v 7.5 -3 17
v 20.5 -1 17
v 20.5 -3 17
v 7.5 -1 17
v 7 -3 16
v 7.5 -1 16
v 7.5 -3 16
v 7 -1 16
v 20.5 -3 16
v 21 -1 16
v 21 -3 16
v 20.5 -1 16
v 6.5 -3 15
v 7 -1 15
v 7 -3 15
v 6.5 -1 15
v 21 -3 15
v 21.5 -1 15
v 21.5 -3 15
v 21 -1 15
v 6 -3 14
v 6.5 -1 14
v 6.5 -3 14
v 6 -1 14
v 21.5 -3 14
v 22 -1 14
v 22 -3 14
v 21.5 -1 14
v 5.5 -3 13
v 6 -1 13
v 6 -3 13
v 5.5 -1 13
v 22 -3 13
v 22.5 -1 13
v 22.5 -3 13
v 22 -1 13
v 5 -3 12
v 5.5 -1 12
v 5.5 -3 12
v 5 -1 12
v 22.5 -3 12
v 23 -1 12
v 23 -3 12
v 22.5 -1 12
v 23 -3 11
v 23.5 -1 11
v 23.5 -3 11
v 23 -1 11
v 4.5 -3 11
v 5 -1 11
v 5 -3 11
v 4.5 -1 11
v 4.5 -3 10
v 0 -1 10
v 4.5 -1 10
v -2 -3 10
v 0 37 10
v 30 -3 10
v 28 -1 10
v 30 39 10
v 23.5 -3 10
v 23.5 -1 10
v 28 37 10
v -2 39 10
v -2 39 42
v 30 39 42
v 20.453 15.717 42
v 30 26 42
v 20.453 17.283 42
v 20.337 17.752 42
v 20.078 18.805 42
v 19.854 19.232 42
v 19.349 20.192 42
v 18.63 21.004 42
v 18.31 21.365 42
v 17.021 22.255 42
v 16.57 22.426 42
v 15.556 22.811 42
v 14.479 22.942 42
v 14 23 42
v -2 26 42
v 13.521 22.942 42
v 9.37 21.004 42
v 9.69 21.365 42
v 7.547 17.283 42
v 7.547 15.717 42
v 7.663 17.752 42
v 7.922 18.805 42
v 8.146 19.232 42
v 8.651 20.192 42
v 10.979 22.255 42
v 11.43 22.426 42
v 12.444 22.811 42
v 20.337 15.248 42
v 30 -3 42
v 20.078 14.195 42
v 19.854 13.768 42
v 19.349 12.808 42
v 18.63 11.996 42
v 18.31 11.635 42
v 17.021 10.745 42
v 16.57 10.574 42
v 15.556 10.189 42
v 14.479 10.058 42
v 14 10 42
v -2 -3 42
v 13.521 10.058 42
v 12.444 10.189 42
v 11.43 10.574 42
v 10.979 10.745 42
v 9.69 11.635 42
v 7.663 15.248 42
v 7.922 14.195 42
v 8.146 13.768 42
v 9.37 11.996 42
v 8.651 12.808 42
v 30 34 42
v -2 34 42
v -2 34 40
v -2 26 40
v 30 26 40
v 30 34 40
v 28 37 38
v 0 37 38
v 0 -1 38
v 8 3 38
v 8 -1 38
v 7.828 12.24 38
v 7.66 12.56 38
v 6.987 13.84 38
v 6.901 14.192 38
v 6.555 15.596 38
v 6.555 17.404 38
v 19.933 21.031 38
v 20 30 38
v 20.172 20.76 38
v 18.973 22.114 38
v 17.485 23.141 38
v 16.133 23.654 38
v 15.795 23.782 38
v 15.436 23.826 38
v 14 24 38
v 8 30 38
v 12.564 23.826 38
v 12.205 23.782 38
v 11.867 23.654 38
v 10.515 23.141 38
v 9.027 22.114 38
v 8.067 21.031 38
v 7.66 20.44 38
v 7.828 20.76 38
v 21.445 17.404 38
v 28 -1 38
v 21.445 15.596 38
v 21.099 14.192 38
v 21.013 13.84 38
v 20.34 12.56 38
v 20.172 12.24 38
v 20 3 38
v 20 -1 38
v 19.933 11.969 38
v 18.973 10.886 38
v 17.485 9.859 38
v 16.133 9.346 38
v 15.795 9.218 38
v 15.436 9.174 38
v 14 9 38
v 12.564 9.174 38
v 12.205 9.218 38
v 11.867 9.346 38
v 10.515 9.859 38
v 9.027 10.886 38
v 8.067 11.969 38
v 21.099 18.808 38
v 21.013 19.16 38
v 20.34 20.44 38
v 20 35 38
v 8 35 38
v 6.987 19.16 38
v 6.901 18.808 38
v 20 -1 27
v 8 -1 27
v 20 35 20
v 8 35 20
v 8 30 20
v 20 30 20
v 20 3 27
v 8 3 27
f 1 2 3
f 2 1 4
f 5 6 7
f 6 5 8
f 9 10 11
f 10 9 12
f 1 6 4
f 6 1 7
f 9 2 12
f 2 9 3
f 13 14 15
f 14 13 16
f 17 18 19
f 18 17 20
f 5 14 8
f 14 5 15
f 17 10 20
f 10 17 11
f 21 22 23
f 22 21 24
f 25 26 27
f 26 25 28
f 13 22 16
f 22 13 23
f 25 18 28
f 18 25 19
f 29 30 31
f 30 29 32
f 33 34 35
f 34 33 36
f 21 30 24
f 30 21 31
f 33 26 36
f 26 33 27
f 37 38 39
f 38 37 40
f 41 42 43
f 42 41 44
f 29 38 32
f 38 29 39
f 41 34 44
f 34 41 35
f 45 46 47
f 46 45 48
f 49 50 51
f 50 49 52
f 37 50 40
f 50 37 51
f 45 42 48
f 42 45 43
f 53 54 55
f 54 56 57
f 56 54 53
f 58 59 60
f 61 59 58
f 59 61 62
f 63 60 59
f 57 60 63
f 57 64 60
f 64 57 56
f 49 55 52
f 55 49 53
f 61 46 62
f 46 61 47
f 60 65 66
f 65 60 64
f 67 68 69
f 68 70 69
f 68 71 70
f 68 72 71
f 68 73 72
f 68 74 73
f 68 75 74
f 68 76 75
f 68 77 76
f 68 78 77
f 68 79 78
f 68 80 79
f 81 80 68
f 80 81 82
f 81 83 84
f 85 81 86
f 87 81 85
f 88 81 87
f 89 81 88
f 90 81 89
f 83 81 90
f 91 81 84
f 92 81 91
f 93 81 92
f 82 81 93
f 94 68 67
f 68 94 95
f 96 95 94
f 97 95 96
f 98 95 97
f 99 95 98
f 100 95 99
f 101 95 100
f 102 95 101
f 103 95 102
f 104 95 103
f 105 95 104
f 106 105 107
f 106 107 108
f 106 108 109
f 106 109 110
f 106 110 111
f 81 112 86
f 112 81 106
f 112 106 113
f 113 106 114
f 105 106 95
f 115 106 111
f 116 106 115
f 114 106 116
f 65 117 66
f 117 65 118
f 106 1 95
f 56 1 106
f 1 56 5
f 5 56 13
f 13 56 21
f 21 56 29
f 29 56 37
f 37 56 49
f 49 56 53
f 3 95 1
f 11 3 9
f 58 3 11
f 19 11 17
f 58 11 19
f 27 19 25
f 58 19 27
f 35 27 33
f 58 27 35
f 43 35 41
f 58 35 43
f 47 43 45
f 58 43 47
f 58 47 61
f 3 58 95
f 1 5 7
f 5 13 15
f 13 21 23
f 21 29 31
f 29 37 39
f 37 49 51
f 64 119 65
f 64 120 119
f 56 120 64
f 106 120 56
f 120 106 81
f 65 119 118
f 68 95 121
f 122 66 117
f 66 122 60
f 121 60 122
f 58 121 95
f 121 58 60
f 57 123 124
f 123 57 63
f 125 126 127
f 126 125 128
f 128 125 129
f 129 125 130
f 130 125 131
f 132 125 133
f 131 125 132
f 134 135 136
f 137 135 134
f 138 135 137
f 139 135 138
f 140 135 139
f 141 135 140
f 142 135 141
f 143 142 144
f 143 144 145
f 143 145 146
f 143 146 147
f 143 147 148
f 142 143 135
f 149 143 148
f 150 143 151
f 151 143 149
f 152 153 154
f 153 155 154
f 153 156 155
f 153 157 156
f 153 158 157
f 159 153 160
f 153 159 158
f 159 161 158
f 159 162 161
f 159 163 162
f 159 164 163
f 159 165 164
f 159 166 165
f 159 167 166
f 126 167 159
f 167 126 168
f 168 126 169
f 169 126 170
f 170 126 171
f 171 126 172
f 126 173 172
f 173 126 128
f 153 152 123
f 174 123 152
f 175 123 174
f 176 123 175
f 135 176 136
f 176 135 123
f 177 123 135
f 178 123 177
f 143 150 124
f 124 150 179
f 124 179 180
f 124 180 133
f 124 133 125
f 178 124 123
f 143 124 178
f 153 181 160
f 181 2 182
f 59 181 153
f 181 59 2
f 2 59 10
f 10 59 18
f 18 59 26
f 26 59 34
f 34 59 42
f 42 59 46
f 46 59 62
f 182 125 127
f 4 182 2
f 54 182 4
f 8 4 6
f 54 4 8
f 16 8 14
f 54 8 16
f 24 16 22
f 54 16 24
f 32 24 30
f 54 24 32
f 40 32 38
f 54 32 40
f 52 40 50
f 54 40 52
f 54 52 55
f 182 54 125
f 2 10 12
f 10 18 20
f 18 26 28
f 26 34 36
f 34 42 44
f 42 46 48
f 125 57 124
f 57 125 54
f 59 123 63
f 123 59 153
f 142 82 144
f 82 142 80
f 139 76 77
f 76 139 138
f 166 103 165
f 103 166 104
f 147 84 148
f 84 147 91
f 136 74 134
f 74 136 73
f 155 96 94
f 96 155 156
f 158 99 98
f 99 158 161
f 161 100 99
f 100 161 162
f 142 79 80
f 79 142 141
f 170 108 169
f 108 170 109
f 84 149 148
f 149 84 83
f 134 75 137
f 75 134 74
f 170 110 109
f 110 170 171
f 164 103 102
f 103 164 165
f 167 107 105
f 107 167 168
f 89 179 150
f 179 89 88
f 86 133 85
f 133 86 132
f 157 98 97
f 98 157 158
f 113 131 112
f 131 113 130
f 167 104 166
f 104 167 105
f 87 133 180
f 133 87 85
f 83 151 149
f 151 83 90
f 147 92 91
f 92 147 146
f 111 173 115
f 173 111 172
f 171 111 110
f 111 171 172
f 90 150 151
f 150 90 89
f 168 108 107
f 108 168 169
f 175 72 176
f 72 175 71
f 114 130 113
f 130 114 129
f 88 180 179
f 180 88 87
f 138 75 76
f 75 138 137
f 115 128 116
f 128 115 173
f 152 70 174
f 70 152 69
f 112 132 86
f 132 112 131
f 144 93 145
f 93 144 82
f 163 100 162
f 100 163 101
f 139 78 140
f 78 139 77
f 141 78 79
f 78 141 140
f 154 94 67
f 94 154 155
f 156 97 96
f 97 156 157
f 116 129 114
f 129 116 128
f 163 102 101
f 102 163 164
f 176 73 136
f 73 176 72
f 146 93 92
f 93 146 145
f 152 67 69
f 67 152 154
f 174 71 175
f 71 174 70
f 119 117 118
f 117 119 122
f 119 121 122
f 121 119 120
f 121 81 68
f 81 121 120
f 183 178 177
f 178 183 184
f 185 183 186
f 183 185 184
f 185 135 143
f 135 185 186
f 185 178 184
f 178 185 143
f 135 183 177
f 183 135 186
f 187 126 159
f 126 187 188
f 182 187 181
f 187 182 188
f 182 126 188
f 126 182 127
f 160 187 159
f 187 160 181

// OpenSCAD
// Shell!
outerX = 42;
outerY = 32;
outerZ = 32;

// BUTTON!
buttonRadius = 7;
buttonOffsetX = 16;

// Wall!
wallSize = 2;

// Ziptie
zipTieSize = 8;
zipTieOffset = 13;

// parts
drawHead = true;
drawTinyHead = false;
drawFoot = false;

if (drawHead) {
  
  translate([30, -3, 10])
    rotate([0, 0, 90])  
  union() {
    difference(){
      cube([outerX, outerY, outerZ]);
      
      // Hollow out
      union() {
        translate([0,0,-7]);
        innerCube(outerX, outerY, outerZ, wallSize);
      }
      
      // USB hole!
      for (i=[3:9]){
        translate([-1, 11-i/2, 9-i])    
          cube([5, 10+i, 1]);
      }
      
      // Button!
      translate([buttonOffsetX + buttonRadius/2, outerY / 2, outerZ - (wallSize * 3)])
        cylinder(r1=buttonRadius+1, r2=buttonRadius-1, h=wallSize * 4);
      
      // Ziptie!
      translate([outerX - zipTieOffset, -1, outerZ - wallSize])
        cube([zipTieSize, outerY + 2, wallSize * 2]);
    }


    // keep pins
    translate([outerX - 9, outerY / 2 - 6, 10]) 
      cube([5, 12, outerZ - 13]);
    translate([1, outerY / 2 - 6, 17]) 
      cube([5, 12, outerZ - 18]);
  }
}

if (drawTinyHead) {
  
  translate([30, -3, 10])
    rotate([0, 0, 90])  
  union() {
    difference(){
      cube([outerX, outerY, outerZ -17]);
      
      // Hollow out
      union() {
        translate([0,0,-7]);
        innerCube(outerX, outerY, outerZ - 17, wallSize);
      }
      
      // USB hole!
      for (i=[3:9]){
        translate([-1, 11-i/2, 9-i])    
          cube([5, 10+i, 1]);
      }
      
      // Ziptie!
      translate([outerX - zipTieOffset, -1, outerZ - wallSize - 17])
        cube([zipTieSize, outerY + 2, wallSize * 2]);
    }
  }
}

// NOTE: places cube 1 unit lower about Z for clean differences.
module innerCube(x, y, z, wallSize) {  
  translate([wallSize, wallSize, -1])
    cube([x - (wallSize * 2), y - (wallSize * 2), z - (wallSize * 2) + 1]);
}

if (drawFoot){
  difference(){
    union(){ 
      difference() {
        union() {
          translate([-2, -3, -4])
            cube([32, 42, 8]);         
        }
        cube([27, 35, 16]);
          
        // Cord slot
        translate([7, 20, 2])
            cube([12, 50, 6]);    
      }
      difference() {
        union(){
          // flaps
          union(){ 
          translate([1, 0, -4])
              cube([5, 1, 10]);
          translate([21, 0, -4])
              cube([5, 1, 10]);
          }
          translate([1, 35, -4])
              cube([25, 1, 10]);
        }
        // Cord slot
        translate([7, 20, 2])
            cube([12, 50, 6]);   
        
 
      }

      //
      translate([13, 11, -1])
            cylinder(d1=6, d2=6, h=11);
      
      translate([13, 25, -1])
            cylinder(d1=6, d2=6, h=11);
    }
    
    // USB slot
    translate([7, -20, 3])
        cube([12, 21, 6]);  
    
    // Ziptie!
    translate([-2, 38 - zipTieOffset, -2 - wallSize*2])
      cube([outerX + 3, zipTieSize, 1+ (wallSize * 2)]);
  }
}
